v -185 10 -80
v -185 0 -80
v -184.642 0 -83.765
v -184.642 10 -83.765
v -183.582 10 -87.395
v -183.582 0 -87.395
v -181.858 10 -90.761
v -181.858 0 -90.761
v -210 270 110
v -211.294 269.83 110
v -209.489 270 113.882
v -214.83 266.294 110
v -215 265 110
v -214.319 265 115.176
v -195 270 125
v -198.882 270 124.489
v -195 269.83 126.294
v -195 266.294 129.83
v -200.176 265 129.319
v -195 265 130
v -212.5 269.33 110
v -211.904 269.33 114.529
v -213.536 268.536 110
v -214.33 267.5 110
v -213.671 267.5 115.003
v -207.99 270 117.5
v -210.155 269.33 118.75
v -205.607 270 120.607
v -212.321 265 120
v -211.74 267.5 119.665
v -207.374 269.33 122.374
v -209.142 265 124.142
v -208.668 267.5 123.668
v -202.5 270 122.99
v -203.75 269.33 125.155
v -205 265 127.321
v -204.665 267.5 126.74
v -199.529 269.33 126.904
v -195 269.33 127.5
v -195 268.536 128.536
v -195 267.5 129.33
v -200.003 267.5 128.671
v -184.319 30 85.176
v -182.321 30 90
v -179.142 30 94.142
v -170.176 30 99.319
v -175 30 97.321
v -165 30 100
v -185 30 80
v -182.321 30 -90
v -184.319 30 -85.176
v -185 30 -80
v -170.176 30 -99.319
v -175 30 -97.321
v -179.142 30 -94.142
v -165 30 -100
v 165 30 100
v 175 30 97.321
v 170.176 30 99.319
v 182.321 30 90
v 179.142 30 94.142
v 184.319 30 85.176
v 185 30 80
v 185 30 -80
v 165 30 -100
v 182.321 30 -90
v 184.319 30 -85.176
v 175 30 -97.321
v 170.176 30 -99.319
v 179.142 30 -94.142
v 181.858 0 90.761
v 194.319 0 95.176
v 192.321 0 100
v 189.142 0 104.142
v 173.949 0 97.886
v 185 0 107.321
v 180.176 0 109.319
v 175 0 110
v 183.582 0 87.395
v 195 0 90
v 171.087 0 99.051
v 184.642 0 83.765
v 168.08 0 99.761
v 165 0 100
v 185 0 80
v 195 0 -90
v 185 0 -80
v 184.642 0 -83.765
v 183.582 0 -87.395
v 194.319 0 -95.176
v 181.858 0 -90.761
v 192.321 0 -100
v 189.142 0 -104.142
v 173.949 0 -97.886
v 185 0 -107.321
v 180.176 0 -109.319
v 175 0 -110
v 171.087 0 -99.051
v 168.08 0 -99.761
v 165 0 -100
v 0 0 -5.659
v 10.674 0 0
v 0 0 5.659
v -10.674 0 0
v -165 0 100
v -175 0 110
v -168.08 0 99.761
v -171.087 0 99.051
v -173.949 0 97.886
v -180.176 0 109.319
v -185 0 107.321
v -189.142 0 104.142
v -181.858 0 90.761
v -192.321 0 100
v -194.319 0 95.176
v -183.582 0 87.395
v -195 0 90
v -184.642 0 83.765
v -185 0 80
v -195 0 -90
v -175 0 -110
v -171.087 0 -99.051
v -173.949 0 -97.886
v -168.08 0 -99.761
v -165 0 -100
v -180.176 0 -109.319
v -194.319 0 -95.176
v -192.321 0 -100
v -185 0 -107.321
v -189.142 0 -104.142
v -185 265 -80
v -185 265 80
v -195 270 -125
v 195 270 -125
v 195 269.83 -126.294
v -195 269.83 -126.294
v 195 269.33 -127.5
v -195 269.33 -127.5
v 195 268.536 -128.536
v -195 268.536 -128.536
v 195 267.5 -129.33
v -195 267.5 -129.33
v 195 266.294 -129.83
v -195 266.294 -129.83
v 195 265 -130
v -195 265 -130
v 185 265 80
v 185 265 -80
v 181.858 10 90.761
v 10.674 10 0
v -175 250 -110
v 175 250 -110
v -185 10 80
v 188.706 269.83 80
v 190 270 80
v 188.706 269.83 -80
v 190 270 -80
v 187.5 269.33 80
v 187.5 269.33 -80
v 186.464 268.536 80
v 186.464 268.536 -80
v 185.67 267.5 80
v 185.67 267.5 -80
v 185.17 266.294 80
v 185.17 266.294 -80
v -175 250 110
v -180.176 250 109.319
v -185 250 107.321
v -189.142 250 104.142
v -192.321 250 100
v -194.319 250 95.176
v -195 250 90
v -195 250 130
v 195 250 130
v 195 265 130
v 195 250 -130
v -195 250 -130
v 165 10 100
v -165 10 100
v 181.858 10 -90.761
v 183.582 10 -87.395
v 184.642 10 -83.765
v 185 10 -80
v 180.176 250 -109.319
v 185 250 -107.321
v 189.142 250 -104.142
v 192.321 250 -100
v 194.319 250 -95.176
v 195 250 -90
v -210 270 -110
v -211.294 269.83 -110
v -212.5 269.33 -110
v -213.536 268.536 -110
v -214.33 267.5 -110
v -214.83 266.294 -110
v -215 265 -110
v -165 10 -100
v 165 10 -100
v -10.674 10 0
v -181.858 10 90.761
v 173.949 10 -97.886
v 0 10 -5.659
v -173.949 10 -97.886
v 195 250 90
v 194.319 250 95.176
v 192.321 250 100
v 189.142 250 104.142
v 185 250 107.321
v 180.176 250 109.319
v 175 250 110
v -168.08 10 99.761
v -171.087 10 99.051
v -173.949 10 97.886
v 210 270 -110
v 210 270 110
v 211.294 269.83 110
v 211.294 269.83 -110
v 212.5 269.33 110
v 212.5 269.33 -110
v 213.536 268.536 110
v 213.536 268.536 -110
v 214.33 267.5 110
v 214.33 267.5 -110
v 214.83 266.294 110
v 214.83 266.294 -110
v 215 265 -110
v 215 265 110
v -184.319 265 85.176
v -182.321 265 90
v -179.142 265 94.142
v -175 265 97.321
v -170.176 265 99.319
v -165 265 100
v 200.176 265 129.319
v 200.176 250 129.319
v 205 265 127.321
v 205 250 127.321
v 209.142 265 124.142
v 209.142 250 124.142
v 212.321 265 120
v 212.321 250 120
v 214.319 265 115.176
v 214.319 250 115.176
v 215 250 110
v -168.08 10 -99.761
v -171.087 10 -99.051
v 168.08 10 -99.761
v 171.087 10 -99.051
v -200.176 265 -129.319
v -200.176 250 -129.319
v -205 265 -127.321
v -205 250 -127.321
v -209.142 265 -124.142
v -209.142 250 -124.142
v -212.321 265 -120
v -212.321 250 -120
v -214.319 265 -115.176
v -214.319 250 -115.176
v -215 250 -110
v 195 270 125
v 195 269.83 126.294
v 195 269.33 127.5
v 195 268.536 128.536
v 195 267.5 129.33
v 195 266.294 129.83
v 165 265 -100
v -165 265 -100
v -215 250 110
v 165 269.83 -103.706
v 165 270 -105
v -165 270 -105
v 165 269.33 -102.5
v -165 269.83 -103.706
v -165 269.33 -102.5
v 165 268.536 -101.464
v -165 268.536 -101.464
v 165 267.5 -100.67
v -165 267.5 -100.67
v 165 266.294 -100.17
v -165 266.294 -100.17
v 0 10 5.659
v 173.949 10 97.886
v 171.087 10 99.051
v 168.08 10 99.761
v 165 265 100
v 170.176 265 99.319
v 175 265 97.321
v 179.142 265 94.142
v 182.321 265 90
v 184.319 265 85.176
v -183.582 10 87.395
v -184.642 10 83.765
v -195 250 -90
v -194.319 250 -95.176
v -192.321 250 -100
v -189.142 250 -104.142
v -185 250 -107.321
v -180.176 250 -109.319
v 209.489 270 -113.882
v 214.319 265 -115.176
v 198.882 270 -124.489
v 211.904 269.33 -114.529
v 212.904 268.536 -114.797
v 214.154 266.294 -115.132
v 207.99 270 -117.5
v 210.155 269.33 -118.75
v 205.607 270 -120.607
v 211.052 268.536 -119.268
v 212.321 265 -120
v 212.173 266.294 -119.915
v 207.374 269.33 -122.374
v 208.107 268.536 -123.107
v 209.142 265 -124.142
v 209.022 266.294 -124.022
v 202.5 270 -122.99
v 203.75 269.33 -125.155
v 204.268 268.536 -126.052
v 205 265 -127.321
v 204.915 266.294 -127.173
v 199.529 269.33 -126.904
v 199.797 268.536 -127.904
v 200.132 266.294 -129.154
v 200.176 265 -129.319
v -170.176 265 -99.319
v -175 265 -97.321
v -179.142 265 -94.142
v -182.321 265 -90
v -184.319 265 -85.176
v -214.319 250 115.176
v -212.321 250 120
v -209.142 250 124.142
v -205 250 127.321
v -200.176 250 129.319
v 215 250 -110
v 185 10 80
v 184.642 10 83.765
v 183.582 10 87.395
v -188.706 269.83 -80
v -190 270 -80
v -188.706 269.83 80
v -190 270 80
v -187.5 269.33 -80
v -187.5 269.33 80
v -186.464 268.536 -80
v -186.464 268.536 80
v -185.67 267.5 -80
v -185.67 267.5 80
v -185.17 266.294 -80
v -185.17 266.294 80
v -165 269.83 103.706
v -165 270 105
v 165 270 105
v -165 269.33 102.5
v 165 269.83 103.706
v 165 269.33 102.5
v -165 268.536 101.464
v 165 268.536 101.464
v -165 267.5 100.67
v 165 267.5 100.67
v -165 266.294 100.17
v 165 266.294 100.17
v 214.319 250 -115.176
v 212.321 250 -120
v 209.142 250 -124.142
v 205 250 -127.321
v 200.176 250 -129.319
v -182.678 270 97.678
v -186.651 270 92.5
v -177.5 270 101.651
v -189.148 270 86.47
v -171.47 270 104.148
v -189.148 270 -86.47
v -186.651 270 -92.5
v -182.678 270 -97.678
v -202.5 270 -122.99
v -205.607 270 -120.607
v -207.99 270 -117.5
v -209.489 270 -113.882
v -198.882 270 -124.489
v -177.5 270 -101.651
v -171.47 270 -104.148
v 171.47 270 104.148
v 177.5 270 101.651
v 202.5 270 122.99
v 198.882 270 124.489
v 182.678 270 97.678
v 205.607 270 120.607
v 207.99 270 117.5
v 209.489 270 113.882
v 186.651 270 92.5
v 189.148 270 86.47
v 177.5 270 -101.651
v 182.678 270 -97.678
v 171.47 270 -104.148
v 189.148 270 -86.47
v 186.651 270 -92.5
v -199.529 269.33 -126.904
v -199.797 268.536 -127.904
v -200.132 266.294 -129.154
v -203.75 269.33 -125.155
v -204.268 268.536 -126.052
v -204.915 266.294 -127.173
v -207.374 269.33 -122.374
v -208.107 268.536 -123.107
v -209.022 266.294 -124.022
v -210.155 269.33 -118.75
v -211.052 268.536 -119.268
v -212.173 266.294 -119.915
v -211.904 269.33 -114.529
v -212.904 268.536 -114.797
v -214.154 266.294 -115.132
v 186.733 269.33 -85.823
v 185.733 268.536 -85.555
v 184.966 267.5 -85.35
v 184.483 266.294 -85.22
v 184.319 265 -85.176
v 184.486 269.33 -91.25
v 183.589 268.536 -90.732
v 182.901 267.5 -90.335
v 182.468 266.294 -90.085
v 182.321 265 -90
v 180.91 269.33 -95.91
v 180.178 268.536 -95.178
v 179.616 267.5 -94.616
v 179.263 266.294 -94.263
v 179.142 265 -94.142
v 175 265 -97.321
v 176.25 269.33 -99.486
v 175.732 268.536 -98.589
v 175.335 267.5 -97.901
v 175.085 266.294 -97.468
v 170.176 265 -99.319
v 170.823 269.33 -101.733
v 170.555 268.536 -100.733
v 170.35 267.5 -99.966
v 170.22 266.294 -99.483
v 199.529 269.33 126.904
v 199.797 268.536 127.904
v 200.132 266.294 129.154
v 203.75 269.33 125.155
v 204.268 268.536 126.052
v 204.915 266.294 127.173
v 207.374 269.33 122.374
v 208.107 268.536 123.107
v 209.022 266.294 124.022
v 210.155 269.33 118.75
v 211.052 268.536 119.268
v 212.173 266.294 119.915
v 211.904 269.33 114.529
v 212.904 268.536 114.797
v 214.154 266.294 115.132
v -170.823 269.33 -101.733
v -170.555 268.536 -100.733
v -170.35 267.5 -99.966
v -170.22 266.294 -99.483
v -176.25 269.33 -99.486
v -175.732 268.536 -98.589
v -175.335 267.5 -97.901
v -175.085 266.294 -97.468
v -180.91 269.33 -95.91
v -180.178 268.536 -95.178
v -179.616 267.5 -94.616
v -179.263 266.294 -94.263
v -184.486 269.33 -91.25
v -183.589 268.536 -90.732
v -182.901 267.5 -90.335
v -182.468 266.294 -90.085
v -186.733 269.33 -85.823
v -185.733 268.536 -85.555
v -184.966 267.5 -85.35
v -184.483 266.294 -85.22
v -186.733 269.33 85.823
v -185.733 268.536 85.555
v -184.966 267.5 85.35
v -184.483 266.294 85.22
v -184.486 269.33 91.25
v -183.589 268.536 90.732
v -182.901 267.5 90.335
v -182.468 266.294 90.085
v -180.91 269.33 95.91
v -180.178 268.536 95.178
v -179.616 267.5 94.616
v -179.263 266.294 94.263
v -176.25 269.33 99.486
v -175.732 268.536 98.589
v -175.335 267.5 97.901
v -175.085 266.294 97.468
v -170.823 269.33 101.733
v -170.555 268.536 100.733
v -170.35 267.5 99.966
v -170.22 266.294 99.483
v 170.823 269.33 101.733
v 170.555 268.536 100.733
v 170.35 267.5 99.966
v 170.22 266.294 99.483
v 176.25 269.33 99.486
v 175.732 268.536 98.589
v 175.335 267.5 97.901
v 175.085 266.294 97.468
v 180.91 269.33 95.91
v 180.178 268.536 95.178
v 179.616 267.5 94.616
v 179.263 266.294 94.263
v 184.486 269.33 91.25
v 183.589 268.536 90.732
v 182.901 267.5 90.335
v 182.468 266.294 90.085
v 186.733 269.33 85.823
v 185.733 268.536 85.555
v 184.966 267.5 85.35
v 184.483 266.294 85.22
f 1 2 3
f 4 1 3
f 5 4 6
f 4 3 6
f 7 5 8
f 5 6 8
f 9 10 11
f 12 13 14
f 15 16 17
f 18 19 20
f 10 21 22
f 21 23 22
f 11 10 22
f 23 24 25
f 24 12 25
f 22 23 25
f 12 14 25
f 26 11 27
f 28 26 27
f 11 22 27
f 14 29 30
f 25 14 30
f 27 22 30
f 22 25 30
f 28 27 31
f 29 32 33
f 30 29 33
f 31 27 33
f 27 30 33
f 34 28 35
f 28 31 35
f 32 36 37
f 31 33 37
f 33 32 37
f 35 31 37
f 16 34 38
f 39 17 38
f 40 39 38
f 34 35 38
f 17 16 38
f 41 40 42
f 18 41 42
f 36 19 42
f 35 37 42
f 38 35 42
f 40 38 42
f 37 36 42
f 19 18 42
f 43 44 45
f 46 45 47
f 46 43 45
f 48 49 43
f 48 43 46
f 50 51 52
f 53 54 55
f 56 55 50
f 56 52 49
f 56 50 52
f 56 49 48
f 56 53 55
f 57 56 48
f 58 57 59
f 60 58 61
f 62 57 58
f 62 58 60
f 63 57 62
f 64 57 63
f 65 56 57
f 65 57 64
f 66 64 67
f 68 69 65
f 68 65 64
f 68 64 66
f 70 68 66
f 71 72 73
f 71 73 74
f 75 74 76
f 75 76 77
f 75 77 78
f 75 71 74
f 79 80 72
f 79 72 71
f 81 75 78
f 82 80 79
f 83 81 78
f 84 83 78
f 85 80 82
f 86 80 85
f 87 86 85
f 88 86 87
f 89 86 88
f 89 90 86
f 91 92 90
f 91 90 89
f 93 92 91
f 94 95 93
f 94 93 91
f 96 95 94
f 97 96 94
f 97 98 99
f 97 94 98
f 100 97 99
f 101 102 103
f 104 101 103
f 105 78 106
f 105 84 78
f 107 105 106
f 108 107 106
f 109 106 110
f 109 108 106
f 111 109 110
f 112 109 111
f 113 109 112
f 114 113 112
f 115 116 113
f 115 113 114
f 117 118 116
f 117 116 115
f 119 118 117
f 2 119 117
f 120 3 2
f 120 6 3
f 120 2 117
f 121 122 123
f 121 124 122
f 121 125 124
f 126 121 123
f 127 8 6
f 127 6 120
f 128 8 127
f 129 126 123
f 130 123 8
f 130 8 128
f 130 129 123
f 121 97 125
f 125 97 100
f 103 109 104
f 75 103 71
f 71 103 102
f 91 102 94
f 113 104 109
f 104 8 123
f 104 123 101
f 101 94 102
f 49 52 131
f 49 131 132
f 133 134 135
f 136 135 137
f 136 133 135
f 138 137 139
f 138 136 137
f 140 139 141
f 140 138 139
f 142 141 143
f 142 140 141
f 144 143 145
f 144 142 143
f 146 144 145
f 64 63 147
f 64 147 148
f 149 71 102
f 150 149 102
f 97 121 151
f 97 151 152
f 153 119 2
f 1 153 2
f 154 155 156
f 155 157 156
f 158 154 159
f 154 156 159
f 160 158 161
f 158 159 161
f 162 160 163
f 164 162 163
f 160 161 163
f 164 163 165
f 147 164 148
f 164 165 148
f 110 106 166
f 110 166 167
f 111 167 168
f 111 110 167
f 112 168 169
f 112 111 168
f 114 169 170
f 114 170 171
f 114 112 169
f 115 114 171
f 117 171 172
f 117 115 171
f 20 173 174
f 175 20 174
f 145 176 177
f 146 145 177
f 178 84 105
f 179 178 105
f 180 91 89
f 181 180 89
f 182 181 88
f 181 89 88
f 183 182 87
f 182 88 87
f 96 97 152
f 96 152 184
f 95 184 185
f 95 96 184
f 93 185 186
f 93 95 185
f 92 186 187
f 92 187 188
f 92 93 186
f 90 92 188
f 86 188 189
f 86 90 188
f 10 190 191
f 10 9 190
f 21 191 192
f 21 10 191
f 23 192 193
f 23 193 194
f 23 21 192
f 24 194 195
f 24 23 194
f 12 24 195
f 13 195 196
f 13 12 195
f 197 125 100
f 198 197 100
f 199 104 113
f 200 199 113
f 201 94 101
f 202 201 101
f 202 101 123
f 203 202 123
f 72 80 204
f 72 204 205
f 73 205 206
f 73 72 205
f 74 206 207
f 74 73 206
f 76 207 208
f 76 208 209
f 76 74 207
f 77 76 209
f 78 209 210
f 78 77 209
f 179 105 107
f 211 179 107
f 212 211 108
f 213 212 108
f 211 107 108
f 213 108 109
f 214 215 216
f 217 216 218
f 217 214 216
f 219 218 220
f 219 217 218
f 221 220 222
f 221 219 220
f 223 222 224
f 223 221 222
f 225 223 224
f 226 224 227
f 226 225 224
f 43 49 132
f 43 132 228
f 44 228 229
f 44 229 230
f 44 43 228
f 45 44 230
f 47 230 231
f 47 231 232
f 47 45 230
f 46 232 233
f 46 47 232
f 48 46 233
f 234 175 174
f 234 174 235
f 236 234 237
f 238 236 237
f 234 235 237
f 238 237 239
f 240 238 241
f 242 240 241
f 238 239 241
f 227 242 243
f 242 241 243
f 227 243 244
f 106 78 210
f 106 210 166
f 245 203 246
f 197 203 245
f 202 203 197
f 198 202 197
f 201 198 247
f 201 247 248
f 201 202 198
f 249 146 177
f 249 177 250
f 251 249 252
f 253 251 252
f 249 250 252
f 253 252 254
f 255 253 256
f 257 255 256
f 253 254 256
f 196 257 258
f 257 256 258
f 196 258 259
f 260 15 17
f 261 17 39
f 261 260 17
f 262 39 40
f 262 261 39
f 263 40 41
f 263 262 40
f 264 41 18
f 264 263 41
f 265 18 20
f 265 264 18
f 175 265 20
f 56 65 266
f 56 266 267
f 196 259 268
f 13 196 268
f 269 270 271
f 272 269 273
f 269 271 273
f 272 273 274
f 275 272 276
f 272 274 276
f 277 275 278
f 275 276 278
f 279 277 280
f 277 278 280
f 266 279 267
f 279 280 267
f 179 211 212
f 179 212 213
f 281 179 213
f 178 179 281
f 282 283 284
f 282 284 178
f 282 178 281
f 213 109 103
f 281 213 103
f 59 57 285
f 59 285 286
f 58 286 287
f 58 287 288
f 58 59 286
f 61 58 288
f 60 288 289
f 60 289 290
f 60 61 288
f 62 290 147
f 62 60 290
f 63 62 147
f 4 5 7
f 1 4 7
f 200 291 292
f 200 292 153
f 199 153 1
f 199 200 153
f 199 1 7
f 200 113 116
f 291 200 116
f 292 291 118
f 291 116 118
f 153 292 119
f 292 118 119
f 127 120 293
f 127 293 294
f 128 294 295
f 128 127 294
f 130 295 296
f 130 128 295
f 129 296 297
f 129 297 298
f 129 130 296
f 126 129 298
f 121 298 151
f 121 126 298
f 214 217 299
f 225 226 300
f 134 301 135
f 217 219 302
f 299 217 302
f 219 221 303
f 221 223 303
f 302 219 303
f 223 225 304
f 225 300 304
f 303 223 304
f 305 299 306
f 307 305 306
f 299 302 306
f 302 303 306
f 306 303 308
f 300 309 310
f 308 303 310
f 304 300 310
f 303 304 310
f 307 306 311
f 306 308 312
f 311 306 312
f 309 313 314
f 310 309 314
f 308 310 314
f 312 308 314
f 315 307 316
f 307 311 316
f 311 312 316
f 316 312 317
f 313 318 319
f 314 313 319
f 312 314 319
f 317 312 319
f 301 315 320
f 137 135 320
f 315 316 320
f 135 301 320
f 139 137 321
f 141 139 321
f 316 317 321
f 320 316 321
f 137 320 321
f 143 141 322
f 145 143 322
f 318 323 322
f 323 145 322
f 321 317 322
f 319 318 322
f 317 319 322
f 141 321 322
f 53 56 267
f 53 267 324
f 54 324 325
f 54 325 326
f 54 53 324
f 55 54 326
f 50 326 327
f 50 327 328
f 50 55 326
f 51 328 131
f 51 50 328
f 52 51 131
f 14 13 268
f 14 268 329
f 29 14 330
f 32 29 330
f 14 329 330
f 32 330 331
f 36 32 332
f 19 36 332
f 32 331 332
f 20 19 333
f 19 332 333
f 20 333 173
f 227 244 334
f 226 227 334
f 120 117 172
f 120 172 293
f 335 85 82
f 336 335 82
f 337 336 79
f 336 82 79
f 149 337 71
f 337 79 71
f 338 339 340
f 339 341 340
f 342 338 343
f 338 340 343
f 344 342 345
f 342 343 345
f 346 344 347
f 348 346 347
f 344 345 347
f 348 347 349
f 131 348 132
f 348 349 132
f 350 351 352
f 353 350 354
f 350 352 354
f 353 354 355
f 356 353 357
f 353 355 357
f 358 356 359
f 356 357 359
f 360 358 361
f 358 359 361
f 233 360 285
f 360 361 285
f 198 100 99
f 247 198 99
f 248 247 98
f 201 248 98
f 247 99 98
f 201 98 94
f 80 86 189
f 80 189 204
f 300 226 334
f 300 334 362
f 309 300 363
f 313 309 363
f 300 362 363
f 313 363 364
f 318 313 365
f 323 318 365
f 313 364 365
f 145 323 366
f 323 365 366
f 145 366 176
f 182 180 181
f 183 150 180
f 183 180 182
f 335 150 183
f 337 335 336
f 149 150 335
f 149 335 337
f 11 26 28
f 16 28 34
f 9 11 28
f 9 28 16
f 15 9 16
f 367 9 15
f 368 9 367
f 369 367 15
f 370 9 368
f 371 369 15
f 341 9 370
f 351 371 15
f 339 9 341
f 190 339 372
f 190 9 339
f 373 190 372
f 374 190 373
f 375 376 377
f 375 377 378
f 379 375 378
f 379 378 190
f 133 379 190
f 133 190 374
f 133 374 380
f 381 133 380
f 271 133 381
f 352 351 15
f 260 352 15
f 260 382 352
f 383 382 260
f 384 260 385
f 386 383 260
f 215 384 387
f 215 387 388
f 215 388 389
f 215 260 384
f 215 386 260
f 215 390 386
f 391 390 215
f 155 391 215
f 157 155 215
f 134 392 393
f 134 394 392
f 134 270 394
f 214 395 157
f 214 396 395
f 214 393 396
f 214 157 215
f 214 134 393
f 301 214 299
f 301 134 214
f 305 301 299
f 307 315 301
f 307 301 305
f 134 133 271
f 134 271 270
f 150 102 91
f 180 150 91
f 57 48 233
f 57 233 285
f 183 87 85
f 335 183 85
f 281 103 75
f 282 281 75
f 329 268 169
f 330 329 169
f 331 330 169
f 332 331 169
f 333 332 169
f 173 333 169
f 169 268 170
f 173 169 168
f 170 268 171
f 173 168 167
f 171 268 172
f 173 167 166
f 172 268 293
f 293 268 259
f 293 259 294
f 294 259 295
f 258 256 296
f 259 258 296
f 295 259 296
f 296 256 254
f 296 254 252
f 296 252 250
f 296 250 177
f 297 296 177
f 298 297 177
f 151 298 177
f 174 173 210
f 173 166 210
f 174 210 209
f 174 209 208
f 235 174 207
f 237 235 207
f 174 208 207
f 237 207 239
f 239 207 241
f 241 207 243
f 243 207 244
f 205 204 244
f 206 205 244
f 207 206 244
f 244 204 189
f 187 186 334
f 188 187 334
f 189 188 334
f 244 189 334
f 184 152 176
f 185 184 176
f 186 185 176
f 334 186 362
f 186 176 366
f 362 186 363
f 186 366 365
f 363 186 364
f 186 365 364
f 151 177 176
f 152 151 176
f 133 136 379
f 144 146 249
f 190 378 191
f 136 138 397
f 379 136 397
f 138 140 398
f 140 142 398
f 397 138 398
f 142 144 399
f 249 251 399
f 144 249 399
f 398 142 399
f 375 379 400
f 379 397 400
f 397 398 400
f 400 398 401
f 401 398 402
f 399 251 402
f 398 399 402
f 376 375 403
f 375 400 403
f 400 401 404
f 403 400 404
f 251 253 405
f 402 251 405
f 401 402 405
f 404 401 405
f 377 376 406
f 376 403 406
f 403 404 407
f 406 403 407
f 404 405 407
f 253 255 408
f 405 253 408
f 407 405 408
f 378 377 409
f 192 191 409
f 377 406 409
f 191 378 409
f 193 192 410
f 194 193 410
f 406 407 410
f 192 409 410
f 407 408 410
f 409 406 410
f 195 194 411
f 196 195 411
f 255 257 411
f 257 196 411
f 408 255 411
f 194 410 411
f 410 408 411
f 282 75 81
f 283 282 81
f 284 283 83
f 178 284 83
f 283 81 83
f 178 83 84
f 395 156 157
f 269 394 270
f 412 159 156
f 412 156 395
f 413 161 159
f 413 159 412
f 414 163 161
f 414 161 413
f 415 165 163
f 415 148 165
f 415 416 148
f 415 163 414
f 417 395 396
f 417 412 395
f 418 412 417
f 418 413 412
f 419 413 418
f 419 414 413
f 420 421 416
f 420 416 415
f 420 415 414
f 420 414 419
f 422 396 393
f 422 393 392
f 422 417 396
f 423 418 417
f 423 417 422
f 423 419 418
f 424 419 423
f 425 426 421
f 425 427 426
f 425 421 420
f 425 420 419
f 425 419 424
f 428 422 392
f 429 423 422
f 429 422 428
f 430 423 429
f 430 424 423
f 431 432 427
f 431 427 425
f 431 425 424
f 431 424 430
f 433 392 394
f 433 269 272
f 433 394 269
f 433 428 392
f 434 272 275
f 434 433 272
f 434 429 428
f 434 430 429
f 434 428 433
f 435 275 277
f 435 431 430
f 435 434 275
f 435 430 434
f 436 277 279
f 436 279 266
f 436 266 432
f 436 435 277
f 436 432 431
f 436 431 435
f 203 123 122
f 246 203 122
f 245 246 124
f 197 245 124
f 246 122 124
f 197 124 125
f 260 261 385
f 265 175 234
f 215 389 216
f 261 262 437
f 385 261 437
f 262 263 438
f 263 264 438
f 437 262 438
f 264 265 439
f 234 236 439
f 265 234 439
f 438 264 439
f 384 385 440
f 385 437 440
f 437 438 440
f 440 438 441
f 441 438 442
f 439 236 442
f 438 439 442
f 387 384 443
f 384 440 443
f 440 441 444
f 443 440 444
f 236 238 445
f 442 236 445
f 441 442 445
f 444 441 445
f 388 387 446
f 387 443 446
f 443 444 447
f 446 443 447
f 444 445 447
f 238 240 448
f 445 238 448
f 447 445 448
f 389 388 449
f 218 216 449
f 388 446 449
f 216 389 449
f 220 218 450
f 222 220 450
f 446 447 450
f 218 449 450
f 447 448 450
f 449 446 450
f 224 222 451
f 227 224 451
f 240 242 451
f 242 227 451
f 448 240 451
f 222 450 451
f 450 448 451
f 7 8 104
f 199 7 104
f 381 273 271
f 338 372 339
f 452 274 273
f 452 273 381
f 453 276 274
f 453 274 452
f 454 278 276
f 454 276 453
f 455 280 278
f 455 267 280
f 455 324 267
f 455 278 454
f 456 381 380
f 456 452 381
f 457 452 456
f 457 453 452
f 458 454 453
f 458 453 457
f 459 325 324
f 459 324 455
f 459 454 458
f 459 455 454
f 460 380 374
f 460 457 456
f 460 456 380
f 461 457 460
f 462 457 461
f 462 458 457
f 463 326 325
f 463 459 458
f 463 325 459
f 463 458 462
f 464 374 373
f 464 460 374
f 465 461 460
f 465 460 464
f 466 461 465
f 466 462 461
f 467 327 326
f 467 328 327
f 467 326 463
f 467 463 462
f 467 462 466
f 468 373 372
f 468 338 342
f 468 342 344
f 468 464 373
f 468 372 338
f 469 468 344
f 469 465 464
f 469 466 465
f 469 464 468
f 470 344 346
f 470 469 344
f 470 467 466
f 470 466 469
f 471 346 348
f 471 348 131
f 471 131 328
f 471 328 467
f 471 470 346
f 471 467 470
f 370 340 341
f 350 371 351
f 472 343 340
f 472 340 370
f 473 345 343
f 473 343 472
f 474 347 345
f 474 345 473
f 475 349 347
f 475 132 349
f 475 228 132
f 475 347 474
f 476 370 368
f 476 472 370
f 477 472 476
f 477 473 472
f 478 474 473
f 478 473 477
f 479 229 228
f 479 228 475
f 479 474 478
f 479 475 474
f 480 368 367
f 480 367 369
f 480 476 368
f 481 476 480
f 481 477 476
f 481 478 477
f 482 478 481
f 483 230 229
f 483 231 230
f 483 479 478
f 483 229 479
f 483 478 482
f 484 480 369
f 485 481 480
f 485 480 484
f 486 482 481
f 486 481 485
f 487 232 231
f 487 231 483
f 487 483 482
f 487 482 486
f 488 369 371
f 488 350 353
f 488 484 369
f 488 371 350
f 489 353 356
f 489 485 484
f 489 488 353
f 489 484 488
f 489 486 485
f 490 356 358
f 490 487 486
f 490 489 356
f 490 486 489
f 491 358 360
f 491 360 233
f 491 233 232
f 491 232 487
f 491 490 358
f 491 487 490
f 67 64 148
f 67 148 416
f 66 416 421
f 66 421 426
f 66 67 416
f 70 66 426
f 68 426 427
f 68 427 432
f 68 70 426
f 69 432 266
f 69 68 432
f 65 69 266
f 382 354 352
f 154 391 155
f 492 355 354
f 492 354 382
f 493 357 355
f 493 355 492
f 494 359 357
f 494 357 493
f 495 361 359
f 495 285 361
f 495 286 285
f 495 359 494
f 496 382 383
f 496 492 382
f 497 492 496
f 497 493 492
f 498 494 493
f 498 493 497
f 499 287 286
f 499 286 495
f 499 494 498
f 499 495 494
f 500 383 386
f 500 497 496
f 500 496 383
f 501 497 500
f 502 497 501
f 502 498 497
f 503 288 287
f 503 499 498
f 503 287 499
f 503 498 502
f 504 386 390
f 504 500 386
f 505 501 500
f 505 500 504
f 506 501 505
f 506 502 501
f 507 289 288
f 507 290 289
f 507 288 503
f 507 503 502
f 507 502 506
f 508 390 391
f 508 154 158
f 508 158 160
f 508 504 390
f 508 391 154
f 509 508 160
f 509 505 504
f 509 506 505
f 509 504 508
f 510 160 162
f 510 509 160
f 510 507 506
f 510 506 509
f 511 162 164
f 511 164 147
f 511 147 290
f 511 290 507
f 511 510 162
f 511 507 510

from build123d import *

# Parameters (mm, degrees)
BOSS_EXTRUDE1_DEPTH = 250
CUT_EXTRUDE3_DEPTH  = 10
BOSS_EXTRUDE2_DEPTH = 20
CUT_EXTRUDE4_START  = -240
CUT_EXTRUDE4_DEPTH  = 240
FILLET1_R           = 5
FILLET2_R           = 5


with BuildPart() as part:
    # Sketch1 → Boss-Extrude1 (new body)
    with BuildSketch(Plane(origin=(0, 0, 0), x_dir=(1, 0, 0), z_dir=(0, 1, 0))):
        with BuildLine():
            Line((-175, 110), (175, 110))
            ThreePointArc((175, 110), (189.142135624, 104.142135624), (195, 90))
            Line((195, 90), (195, -90))
            ThreePointArc((195, -90), (189.142135624, -104.142135624), (175, -110))
            Line((175, -110), (-175, -110))
            ThreePointArc((-175, -110), (-189.142135624, -104.142135624), (-195, -90))
            Line((-195, -90), (-195, 90))
            ThreePointArc((-195, 90), (-189.142135624, 104.142135624), (-175, 110))
        make_face()
    extrude(amount=BOSS_EXTRUDE1_DEPTH)

    # Sketch3 → Cut-Extrude3 (cut)
    with BuildSketch(Plane.XZ):
        with BuildLine():
            Line((0, -5.659305135), (-173.94856301, -97.886397626))
            ThreePointArc((-173.94856301, -97.886397626), (-169.597393146, -99.464428485), (-165, -100))
            Line((-165, -100), (165, -100))
            ThreePointArc((165, -100), (169.597393146, -99.464428485), (173.94856301, -97.886397626))
            Line((173.94856301, -97.886397626), (0, -5.659305135))
        make_face()
        with BuildLine():
            ThreePointArc((-185, -80), (-184.19844413, -85.605331658), (-181.8580257, -90.761364667))
            Line((-181.8580257, -90.761364667), (-10.673956744, 0))
            Line((-10.673956744, 0), (-181.8580257, 90.761364667))
            ThreePointArc((-181.8580257, 90.761364667), (-184.19844413, 85.605331658), (-185, 80))
            Line((-185, 80), (-185, -80))
        make_face()
        with BuildLine():
            Line((-173.94856301, 97.886397626), (0, 5.659305135))
            Line((0, 5.659305135), (173.94856301, 97.886397626))
            ThreePointArc((173.94856301, 97.886397626), (169.597393146, 99.464428485), (165, 100))
            Line((165, 100), (-165, 100))
            ThreePointArc((-165, 100), (-169.597393146, 99.464428485), (-173.94856301, 97.886397626))
        make_face()
        with BuildLine():
            Line((181.8580257, 90.761364667), (10.673956744, 0))
            Line((10.673956744, 0), (181.8580257, -90.761364667))
            ThreePointArc((181.8580257, -90.761364667), (184.19844413, -85.605331658), (185, -80))
            Line((185, -80), (185, 80))
            ThreePointArc((185, 80), (184.19844413, 85.605331658), (181.8580257, 90.761364667))
        make_face()
    extrude(amount=-CUT_EXTRUDE3_DEPTH, mode=Mode.SUBTRACT)

    # Sketch5 → Boss-Extrude2 (add)
    with BuildSketch(Plane(origin=(0, 250, 0), x_dir=(1, 0, 0), z_dir=(0, 1, 0))):
        with BuildLine():
            Line((195, 130), (-195, 130))
            ThreePointArc((-195, 130), (-209.142135624, 124.142135624), (-215, 110))
            Line((-215, 110), (-215, -110))
            ThreePointArc((-215, -110), (-209.142135624, -124.142135624), (-195, -130))
            Line((-195, -130), (195, -130))
            ThreePointArc((195, -130), (209.142135624, -124.142135624), (215, -110))
            Line((215, -110), (215, 110))
            ThreePointArc((215, 110), (209.142135624, 124.142135624), (195, 130))
        make_face()
    extrude(amount=BOSS_EXTRUDE2_DEPTH)

    # Sketch6 → Cut-Extrude4 (cut)
    with BuildSketch(Plane(origin=(0, 270, 0), x_dir=(1, 0, 0), z_dir=(0, 1, 0)).offset(CUT_EXTRUDE4_START)):
        with BuildLine():
            Line((-165, -100), (165, -100))
            ThreePointArc((165, -100), (179.142135624, -94.142135624), (185, -80))
            Line((185, -80), (185, 80))
            ThreePointArc((185, 80), (179.142135624, 94.142135624), (165, 100))
            Line((165, 100), (-165, 100))
            ThreePointArc((-165, 100), (-179.142135624, 94.142135624), (-185, 80))
            Line((-185, 80), (-185, -80))
            ThreePointArc((-185, -80), (-179.142135624, -94.142135624), (-165, -100))
        make_face()
    extrude(amount=CUT_EXTRUDE4_DEPTH, mode=Mode.SUBTRACT)

    # Fillet1
    fillet1_edges = [part.edges().sort_by_distance(p)[0] for p in [
        (179.142135624, 270, -94.142135624),
        (0, 270, -100),
        (-179.142135624, 270, -94.142135624),
        (-185, 270, 0),
        (-179.142135624, 270, 94.142135624),
        (0, 270, 100),
        (179.142135624, 270, 94.142135624),
        (185, 270, 0),
    ]]
    fillet(fillet1_edges, radius=FILLET1_R)

    # Fillet2
    fillet2_edges = [part.edges().sort_by_distance(p)[0] for p in [
        (-209.142135624, 270, 124.142135624),
        (0, 270, 130),
        (209.142135624, 270, 124.142135624),
        (215, 270, 0),
        (209.142135624, 270, -124.142135624),
        (0, 270, -130),
        (-209.142135624, 270, -124.142135624),
        (-215, 270, 0),
    ]]
    fillet(fillet2_edges, radius=FILLET2_R)


solid = part.part
